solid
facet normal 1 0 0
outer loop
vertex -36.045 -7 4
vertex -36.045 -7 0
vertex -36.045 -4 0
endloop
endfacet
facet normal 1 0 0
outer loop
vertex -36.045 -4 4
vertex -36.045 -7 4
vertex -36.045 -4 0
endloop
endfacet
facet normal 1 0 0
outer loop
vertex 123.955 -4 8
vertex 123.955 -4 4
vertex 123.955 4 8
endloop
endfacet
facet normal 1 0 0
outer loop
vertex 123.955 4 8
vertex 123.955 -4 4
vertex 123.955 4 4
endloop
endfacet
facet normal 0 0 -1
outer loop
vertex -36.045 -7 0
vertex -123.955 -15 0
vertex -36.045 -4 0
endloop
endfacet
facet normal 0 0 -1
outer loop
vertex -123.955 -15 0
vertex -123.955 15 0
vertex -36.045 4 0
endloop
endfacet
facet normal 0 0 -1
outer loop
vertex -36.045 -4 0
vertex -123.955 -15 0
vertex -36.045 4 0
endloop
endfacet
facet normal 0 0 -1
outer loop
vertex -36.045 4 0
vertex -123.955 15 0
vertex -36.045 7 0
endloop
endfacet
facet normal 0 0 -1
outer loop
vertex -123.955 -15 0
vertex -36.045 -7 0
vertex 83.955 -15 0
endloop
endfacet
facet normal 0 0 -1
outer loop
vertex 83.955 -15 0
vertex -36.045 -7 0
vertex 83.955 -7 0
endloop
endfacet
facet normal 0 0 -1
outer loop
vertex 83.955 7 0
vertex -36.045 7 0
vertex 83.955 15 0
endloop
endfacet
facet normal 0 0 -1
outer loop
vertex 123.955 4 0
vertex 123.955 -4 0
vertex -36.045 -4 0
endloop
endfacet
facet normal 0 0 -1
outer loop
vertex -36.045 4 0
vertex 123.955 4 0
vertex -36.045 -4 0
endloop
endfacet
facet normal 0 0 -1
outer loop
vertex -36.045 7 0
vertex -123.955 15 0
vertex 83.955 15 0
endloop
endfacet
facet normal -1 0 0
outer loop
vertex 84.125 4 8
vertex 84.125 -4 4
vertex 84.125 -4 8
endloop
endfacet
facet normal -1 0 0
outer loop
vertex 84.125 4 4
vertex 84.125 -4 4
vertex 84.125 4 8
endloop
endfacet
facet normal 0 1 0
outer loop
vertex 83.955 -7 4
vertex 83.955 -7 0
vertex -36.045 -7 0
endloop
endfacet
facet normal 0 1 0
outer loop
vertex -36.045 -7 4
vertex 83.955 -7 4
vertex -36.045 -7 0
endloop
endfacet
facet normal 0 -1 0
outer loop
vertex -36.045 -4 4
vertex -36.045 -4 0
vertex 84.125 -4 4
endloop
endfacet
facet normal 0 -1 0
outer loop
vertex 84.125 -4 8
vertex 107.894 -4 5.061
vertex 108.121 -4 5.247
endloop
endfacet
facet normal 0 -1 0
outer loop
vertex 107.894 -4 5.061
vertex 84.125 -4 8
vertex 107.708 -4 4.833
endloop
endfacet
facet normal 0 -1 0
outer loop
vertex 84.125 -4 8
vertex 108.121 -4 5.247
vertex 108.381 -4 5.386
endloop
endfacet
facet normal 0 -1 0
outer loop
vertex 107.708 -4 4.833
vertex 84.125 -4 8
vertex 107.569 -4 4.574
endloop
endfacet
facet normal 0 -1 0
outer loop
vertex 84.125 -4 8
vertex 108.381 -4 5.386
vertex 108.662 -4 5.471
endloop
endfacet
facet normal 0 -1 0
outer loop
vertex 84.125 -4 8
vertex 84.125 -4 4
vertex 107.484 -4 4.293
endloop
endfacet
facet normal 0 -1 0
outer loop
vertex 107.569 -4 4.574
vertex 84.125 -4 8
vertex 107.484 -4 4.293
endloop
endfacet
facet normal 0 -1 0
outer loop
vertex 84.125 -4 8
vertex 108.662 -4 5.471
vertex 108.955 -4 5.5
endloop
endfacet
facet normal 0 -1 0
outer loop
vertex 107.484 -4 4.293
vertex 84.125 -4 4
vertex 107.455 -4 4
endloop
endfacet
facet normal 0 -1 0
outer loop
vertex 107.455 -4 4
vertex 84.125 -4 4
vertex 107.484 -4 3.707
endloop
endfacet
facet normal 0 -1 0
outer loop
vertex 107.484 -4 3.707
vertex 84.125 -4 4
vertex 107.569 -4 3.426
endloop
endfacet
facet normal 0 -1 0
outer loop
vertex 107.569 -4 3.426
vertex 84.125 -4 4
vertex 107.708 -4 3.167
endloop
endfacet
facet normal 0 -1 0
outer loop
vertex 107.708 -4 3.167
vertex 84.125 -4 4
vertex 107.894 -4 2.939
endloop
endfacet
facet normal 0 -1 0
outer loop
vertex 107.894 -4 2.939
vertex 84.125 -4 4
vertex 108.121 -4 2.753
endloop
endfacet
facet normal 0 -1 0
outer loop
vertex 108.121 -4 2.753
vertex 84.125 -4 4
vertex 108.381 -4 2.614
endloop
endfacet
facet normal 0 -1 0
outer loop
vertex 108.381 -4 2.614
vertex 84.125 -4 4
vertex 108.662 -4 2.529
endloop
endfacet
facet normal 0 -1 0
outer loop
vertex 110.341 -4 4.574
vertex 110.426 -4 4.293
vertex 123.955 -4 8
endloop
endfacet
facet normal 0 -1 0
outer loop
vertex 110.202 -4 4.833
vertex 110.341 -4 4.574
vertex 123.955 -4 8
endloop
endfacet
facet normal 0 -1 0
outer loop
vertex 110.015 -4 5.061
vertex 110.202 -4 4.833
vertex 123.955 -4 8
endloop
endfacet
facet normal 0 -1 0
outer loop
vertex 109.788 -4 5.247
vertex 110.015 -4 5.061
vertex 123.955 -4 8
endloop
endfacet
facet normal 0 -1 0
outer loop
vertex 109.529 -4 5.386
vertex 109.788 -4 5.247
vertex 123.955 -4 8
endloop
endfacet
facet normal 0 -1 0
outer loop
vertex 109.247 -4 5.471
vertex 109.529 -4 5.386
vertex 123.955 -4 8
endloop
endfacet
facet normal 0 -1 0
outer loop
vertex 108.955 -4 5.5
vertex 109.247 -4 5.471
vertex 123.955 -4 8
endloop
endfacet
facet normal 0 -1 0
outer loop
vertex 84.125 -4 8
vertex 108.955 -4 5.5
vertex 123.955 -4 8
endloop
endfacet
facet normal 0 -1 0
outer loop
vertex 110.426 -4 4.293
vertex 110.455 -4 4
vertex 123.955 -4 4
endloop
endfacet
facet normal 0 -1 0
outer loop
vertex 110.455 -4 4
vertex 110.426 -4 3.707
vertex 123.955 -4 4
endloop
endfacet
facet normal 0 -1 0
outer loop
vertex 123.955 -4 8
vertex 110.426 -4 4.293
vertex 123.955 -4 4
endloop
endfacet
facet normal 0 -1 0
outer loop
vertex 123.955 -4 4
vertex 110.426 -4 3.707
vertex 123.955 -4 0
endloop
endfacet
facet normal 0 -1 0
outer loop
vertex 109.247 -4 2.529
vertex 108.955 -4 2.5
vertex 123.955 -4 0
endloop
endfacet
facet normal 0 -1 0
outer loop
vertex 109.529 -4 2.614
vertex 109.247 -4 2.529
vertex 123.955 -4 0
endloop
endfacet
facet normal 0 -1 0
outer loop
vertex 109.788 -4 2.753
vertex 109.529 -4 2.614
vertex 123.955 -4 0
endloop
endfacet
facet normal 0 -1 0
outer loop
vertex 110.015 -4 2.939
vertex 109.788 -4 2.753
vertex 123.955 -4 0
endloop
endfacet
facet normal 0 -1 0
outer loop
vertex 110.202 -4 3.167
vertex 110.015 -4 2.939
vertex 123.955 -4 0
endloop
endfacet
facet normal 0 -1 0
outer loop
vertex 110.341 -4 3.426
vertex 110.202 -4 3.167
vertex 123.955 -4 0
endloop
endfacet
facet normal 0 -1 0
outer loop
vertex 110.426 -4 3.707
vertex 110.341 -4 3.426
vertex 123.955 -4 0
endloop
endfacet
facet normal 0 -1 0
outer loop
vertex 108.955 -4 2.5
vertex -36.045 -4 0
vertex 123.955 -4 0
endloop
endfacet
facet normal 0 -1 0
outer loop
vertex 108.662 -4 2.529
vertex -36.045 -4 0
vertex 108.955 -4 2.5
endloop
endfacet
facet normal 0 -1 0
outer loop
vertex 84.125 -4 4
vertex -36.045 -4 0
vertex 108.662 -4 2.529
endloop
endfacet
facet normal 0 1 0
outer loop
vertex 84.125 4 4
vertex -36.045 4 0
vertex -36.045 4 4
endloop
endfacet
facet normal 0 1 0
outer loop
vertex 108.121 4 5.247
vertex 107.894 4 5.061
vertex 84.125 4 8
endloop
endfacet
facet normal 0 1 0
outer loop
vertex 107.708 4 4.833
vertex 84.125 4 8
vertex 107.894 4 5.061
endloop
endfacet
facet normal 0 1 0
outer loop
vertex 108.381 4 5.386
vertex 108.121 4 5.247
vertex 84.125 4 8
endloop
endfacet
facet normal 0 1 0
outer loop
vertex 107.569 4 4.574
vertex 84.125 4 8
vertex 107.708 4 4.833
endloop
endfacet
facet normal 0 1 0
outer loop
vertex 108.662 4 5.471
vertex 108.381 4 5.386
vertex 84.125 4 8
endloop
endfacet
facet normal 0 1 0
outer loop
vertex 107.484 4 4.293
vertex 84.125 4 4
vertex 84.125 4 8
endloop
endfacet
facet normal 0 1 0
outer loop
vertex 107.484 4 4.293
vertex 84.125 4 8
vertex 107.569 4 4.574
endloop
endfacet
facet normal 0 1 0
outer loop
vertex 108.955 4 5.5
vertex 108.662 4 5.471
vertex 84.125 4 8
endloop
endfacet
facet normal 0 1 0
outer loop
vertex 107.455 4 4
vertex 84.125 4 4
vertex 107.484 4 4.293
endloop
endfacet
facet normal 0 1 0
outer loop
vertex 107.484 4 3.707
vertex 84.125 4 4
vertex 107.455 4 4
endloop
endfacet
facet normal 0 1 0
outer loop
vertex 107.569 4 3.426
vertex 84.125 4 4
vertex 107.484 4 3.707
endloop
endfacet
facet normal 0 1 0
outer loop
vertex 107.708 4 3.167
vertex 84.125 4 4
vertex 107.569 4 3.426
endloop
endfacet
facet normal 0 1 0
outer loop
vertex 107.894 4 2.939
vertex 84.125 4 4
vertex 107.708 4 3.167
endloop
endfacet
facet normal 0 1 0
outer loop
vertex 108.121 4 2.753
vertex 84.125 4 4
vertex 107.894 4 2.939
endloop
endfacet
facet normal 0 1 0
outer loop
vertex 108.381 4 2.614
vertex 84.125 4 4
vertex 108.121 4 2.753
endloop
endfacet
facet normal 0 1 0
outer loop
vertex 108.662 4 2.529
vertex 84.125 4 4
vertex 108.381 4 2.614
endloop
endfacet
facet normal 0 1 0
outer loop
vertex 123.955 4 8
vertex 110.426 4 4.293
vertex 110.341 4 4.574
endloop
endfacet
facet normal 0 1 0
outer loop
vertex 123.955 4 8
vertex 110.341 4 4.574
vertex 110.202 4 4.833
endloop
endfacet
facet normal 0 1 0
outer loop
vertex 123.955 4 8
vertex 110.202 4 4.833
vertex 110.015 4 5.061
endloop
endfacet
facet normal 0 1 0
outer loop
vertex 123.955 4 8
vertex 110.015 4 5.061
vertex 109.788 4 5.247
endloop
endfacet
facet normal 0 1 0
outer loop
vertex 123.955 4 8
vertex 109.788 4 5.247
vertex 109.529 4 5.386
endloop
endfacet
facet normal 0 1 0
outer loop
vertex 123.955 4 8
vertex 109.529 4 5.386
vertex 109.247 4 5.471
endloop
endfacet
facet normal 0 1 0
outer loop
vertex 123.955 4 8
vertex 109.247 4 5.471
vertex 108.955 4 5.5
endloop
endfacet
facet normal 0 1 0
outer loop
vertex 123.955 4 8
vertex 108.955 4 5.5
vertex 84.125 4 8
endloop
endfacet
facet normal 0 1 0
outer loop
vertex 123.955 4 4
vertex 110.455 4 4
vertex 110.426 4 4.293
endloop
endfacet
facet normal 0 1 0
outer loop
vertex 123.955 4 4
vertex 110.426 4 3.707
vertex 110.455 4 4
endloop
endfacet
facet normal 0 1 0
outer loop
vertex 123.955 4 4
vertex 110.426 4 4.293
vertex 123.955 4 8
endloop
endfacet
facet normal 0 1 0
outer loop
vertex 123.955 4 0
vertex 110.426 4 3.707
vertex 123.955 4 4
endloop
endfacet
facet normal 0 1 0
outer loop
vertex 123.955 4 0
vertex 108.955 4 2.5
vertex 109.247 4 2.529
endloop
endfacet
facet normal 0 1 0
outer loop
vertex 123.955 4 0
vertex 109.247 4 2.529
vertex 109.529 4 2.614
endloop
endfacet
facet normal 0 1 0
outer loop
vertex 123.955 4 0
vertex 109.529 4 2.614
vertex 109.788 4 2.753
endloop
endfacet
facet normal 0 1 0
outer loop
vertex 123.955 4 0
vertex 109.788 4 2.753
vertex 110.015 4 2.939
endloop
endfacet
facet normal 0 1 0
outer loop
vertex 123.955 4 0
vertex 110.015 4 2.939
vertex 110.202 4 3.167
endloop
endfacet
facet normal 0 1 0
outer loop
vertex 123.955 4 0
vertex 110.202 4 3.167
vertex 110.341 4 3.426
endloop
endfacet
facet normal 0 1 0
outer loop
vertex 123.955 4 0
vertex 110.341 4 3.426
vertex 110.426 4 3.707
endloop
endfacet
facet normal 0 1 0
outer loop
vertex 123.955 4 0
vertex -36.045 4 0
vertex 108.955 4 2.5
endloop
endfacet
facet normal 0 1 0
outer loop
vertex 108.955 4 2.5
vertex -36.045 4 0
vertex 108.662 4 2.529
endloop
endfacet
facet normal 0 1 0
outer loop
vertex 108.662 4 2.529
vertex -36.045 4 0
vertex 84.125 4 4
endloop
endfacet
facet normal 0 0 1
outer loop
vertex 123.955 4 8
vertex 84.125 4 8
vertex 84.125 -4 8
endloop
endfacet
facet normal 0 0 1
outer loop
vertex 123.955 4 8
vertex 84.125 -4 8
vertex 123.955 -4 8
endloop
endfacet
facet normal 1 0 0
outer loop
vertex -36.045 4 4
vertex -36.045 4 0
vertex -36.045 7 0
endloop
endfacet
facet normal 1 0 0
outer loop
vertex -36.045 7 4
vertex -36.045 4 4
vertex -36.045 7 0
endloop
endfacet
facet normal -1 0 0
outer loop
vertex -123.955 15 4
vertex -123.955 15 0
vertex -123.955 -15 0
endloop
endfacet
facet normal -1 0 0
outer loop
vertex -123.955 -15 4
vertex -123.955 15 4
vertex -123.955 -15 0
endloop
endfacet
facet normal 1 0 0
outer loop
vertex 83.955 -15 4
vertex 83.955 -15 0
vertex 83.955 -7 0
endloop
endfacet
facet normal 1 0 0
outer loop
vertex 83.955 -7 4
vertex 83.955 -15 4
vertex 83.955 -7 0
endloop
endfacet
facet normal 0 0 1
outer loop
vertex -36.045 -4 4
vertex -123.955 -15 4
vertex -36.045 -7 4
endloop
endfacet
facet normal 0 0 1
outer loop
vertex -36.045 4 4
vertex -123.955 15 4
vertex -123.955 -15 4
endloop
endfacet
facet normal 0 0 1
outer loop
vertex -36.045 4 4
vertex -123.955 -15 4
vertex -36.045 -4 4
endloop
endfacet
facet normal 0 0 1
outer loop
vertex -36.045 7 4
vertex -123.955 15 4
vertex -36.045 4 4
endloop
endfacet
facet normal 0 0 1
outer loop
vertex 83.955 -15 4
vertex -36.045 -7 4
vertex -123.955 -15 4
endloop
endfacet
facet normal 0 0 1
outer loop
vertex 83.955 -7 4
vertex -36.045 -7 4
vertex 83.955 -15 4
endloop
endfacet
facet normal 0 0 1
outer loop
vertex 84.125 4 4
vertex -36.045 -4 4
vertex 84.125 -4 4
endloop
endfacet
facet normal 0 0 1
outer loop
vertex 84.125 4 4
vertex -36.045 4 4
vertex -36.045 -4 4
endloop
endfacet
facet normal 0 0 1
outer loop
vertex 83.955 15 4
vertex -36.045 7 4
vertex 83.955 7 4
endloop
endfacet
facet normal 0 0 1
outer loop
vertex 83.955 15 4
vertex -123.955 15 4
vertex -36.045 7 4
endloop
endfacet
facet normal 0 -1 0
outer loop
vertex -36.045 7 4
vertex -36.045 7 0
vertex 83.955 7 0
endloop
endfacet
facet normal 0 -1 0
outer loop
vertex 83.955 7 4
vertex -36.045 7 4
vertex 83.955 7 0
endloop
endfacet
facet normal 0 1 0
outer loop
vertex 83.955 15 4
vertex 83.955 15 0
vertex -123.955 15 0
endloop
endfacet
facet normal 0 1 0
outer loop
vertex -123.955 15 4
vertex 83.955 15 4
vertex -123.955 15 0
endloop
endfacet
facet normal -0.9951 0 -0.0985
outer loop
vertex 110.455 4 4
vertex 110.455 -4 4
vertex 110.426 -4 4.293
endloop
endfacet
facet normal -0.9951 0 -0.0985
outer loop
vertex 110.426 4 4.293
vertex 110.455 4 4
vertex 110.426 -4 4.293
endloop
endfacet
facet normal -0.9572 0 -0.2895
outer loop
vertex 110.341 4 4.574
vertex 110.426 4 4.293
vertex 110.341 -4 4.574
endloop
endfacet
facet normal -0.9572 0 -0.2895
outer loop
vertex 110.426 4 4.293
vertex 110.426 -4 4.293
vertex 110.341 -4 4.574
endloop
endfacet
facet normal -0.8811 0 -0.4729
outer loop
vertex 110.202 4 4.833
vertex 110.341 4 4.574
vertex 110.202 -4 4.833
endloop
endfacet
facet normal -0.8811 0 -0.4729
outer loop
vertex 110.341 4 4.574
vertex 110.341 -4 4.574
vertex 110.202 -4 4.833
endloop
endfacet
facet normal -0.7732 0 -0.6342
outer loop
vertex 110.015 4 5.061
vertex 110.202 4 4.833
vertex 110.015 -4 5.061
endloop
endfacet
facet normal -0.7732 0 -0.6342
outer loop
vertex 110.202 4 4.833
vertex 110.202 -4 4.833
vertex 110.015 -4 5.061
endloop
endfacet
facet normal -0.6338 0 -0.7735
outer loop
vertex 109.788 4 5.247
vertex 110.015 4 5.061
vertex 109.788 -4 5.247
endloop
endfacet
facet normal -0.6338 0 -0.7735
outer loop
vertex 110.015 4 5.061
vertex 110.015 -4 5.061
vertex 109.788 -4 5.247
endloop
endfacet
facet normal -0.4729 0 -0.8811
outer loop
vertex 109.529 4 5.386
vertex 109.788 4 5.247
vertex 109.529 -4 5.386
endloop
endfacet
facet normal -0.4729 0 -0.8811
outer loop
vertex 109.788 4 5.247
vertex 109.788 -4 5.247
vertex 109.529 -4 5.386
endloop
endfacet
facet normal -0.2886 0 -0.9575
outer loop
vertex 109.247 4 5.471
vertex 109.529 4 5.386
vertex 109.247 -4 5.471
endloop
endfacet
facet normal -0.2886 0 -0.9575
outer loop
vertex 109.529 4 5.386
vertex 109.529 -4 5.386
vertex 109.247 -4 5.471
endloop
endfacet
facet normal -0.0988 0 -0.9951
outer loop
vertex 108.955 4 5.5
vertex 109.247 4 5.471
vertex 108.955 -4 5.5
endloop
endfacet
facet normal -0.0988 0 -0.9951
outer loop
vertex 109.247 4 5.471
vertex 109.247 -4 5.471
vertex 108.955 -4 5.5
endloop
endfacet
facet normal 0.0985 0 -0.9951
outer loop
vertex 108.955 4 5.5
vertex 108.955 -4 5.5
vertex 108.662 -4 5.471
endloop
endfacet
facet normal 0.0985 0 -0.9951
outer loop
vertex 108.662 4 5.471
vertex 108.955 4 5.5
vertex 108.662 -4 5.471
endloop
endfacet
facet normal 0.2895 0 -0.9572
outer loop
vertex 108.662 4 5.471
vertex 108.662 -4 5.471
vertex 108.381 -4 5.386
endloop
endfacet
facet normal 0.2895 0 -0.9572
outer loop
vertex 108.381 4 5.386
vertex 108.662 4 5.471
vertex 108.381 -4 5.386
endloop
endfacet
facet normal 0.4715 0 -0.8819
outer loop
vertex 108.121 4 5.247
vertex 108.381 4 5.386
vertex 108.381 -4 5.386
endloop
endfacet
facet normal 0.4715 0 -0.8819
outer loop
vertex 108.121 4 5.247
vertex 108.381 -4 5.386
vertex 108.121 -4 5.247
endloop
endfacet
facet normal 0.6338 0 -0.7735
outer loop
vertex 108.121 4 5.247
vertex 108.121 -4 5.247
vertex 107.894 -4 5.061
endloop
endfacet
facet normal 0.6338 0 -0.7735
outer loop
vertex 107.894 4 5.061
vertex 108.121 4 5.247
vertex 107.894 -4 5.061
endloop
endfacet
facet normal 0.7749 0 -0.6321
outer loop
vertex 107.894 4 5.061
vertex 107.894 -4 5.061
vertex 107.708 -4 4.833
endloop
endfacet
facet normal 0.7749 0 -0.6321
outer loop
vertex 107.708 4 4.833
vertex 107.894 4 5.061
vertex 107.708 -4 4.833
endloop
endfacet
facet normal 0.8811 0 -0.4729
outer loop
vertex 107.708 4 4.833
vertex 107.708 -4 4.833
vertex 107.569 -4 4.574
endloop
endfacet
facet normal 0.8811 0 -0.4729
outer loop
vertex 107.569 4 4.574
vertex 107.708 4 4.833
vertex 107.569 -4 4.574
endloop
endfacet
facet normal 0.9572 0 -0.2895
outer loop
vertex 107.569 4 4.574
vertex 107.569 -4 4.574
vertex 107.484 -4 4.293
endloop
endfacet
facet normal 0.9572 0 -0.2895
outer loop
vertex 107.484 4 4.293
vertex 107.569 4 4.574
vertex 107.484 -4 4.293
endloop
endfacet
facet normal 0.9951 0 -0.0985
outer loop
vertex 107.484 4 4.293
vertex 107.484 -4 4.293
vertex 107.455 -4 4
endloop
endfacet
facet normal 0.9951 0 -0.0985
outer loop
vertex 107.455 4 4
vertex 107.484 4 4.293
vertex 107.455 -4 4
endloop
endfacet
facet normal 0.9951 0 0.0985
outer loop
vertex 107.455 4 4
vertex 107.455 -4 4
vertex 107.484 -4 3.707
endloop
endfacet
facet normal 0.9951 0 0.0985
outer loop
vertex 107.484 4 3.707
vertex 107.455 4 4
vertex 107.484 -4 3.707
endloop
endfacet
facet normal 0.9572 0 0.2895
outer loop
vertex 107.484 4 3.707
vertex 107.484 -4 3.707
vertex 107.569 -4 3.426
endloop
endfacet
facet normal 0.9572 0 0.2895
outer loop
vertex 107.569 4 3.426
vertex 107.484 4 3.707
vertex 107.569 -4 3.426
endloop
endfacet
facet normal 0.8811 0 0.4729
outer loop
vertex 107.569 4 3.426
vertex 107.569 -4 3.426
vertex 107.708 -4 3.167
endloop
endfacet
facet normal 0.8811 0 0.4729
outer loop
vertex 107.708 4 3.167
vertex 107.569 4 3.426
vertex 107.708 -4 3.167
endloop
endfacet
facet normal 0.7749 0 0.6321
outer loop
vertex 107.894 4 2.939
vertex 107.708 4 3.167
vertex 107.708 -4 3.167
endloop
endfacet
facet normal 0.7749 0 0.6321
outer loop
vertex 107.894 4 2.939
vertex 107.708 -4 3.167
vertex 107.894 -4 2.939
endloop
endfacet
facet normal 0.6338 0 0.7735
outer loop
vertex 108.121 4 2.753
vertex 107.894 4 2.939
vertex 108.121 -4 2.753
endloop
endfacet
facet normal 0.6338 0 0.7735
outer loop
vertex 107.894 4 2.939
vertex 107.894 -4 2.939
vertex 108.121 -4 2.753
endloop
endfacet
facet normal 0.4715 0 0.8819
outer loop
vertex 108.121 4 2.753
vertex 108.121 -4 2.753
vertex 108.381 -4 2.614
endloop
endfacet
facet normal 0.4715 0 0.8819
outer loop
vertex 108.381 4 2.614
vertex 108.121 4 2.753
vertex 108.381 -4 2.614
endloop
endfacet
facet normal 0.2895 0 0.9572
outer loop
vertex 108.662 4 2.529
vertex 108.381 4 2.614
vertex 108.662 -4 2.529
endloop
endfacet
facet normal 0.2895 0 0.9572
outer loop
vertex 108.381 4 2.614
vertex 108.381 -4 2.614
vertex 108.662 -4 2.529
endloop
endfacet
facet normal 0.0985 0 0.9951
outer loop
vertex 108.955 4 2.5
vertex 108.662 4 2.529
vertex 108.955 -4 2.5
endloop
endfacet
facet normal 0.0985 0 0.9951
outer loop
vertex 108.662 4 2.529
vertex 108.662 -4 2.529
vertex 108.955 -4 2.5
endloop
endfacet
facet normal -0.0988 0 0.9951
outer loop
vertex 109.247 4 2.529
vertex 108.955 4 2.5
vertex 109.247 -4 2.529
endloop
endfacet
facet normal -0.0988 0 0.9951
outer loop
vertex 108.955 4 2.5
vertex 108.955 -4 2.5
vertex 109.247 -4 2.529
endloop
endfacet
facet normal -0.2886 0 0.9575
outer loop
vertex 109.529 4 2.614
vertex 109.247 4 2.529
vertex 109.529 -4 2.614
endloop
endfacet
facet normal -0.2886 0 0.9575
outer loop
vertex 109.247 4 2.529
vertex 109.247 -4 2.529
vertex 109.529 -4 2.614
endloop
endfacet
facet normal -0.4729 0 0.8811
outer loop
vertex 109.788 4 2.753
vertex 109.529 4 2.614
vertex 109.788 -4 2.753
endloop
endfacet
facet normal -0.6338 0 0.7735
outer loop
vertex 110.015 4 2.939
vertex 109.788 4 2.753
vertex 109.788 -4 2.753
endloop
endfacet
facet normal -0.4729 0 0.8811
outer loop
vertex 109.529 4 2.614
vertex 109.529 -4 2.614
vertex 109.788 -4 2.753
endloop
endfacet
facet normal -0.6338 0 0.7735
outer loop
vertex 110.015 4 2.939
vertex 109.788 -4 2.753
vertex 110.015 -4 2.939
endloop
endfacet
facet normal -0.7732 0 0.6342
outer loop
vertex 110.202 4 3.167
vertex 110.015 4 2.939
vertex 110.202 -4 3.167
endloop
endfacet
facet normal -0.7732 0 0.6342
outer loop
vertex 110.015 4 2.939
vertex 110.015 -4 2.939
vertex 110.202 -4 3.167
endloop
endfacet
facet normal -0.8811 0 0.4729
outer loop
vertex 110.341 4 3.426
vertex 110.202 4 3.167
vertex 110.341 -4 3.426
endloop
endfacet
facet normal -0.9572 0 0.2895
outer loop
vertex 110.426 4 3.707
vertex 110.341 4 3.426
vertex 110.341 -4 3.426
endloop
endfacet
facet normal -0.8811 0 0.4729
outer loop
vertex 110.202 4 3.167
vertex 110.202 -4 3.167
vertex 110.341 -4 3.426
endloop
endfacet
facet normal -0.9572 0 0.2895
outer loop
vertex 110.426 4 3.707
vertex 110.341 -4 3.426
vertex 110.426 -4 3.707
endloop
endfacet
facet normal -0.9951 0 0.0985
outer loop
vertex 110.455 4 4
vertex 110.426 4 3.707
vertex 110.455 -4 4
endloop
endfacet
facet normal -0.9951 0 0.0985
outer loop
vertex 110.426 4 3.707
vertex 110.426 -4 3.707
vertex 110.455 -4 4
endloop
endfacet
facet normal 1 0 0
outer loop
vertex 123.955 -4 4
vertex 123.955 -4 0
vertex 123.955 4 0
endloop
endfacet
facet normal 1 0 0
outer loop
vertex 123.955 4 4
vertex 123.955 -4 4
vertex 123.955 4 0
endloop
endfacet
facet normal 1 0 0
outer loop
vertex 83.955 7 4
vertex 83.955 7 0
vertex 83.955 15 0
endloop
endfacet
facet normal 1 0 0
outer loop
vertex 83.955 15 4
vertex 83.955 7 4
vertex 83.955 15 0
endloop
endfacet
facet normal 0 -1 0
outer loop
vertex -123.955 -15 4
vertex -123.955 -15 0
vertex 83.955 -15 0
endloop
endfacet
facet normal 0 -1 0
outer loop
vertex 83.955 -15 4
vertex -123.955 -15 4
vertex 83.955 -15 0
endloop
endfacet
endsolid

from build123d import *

# Parameters (mm, degrees)
F1_DEPTH = 4
F2_W     = 39.829583
F2_H     = 8
F3_DEPTH = 4
F4_R     = 1.5
F5_DEPTH = 12


with BuildPart() as f1:
    # F0 (on Top) → F1 (new body)
    with BuildSketch(Plane.XY):
        Polygon((-123.954707, -15), (83.954707, -15), (83.954707, -7), (-36.045293, -7), (-36.045293, -4), (123.954707, -4), (123.954707, 4), (-36.045293, 4), (-36.045293, 7), (83.954707, 7), (83.954707, 15), (-123.954707, 15), align=None)
    extrude(amount=F1_DEPTH)

    # F2 (on face) → F3 (join)
    with BuildSketch(Plane.XY.offset(4)):
        with Locations((104.039916, 0)):
            Rectangle(F2_W, F2_H)
    extrude(amount=F3_DEPTH)

    # F4 (on face) → F5 (cut)
    with BuildSketch(Plane.XZ.offset(4)):
        with Locations((108.954707, 4)):
            Circle(F4_R)
    extrude(amount=-F5_DEPTH, mode=Mode.SUBTRACT)


solid = f1.part
